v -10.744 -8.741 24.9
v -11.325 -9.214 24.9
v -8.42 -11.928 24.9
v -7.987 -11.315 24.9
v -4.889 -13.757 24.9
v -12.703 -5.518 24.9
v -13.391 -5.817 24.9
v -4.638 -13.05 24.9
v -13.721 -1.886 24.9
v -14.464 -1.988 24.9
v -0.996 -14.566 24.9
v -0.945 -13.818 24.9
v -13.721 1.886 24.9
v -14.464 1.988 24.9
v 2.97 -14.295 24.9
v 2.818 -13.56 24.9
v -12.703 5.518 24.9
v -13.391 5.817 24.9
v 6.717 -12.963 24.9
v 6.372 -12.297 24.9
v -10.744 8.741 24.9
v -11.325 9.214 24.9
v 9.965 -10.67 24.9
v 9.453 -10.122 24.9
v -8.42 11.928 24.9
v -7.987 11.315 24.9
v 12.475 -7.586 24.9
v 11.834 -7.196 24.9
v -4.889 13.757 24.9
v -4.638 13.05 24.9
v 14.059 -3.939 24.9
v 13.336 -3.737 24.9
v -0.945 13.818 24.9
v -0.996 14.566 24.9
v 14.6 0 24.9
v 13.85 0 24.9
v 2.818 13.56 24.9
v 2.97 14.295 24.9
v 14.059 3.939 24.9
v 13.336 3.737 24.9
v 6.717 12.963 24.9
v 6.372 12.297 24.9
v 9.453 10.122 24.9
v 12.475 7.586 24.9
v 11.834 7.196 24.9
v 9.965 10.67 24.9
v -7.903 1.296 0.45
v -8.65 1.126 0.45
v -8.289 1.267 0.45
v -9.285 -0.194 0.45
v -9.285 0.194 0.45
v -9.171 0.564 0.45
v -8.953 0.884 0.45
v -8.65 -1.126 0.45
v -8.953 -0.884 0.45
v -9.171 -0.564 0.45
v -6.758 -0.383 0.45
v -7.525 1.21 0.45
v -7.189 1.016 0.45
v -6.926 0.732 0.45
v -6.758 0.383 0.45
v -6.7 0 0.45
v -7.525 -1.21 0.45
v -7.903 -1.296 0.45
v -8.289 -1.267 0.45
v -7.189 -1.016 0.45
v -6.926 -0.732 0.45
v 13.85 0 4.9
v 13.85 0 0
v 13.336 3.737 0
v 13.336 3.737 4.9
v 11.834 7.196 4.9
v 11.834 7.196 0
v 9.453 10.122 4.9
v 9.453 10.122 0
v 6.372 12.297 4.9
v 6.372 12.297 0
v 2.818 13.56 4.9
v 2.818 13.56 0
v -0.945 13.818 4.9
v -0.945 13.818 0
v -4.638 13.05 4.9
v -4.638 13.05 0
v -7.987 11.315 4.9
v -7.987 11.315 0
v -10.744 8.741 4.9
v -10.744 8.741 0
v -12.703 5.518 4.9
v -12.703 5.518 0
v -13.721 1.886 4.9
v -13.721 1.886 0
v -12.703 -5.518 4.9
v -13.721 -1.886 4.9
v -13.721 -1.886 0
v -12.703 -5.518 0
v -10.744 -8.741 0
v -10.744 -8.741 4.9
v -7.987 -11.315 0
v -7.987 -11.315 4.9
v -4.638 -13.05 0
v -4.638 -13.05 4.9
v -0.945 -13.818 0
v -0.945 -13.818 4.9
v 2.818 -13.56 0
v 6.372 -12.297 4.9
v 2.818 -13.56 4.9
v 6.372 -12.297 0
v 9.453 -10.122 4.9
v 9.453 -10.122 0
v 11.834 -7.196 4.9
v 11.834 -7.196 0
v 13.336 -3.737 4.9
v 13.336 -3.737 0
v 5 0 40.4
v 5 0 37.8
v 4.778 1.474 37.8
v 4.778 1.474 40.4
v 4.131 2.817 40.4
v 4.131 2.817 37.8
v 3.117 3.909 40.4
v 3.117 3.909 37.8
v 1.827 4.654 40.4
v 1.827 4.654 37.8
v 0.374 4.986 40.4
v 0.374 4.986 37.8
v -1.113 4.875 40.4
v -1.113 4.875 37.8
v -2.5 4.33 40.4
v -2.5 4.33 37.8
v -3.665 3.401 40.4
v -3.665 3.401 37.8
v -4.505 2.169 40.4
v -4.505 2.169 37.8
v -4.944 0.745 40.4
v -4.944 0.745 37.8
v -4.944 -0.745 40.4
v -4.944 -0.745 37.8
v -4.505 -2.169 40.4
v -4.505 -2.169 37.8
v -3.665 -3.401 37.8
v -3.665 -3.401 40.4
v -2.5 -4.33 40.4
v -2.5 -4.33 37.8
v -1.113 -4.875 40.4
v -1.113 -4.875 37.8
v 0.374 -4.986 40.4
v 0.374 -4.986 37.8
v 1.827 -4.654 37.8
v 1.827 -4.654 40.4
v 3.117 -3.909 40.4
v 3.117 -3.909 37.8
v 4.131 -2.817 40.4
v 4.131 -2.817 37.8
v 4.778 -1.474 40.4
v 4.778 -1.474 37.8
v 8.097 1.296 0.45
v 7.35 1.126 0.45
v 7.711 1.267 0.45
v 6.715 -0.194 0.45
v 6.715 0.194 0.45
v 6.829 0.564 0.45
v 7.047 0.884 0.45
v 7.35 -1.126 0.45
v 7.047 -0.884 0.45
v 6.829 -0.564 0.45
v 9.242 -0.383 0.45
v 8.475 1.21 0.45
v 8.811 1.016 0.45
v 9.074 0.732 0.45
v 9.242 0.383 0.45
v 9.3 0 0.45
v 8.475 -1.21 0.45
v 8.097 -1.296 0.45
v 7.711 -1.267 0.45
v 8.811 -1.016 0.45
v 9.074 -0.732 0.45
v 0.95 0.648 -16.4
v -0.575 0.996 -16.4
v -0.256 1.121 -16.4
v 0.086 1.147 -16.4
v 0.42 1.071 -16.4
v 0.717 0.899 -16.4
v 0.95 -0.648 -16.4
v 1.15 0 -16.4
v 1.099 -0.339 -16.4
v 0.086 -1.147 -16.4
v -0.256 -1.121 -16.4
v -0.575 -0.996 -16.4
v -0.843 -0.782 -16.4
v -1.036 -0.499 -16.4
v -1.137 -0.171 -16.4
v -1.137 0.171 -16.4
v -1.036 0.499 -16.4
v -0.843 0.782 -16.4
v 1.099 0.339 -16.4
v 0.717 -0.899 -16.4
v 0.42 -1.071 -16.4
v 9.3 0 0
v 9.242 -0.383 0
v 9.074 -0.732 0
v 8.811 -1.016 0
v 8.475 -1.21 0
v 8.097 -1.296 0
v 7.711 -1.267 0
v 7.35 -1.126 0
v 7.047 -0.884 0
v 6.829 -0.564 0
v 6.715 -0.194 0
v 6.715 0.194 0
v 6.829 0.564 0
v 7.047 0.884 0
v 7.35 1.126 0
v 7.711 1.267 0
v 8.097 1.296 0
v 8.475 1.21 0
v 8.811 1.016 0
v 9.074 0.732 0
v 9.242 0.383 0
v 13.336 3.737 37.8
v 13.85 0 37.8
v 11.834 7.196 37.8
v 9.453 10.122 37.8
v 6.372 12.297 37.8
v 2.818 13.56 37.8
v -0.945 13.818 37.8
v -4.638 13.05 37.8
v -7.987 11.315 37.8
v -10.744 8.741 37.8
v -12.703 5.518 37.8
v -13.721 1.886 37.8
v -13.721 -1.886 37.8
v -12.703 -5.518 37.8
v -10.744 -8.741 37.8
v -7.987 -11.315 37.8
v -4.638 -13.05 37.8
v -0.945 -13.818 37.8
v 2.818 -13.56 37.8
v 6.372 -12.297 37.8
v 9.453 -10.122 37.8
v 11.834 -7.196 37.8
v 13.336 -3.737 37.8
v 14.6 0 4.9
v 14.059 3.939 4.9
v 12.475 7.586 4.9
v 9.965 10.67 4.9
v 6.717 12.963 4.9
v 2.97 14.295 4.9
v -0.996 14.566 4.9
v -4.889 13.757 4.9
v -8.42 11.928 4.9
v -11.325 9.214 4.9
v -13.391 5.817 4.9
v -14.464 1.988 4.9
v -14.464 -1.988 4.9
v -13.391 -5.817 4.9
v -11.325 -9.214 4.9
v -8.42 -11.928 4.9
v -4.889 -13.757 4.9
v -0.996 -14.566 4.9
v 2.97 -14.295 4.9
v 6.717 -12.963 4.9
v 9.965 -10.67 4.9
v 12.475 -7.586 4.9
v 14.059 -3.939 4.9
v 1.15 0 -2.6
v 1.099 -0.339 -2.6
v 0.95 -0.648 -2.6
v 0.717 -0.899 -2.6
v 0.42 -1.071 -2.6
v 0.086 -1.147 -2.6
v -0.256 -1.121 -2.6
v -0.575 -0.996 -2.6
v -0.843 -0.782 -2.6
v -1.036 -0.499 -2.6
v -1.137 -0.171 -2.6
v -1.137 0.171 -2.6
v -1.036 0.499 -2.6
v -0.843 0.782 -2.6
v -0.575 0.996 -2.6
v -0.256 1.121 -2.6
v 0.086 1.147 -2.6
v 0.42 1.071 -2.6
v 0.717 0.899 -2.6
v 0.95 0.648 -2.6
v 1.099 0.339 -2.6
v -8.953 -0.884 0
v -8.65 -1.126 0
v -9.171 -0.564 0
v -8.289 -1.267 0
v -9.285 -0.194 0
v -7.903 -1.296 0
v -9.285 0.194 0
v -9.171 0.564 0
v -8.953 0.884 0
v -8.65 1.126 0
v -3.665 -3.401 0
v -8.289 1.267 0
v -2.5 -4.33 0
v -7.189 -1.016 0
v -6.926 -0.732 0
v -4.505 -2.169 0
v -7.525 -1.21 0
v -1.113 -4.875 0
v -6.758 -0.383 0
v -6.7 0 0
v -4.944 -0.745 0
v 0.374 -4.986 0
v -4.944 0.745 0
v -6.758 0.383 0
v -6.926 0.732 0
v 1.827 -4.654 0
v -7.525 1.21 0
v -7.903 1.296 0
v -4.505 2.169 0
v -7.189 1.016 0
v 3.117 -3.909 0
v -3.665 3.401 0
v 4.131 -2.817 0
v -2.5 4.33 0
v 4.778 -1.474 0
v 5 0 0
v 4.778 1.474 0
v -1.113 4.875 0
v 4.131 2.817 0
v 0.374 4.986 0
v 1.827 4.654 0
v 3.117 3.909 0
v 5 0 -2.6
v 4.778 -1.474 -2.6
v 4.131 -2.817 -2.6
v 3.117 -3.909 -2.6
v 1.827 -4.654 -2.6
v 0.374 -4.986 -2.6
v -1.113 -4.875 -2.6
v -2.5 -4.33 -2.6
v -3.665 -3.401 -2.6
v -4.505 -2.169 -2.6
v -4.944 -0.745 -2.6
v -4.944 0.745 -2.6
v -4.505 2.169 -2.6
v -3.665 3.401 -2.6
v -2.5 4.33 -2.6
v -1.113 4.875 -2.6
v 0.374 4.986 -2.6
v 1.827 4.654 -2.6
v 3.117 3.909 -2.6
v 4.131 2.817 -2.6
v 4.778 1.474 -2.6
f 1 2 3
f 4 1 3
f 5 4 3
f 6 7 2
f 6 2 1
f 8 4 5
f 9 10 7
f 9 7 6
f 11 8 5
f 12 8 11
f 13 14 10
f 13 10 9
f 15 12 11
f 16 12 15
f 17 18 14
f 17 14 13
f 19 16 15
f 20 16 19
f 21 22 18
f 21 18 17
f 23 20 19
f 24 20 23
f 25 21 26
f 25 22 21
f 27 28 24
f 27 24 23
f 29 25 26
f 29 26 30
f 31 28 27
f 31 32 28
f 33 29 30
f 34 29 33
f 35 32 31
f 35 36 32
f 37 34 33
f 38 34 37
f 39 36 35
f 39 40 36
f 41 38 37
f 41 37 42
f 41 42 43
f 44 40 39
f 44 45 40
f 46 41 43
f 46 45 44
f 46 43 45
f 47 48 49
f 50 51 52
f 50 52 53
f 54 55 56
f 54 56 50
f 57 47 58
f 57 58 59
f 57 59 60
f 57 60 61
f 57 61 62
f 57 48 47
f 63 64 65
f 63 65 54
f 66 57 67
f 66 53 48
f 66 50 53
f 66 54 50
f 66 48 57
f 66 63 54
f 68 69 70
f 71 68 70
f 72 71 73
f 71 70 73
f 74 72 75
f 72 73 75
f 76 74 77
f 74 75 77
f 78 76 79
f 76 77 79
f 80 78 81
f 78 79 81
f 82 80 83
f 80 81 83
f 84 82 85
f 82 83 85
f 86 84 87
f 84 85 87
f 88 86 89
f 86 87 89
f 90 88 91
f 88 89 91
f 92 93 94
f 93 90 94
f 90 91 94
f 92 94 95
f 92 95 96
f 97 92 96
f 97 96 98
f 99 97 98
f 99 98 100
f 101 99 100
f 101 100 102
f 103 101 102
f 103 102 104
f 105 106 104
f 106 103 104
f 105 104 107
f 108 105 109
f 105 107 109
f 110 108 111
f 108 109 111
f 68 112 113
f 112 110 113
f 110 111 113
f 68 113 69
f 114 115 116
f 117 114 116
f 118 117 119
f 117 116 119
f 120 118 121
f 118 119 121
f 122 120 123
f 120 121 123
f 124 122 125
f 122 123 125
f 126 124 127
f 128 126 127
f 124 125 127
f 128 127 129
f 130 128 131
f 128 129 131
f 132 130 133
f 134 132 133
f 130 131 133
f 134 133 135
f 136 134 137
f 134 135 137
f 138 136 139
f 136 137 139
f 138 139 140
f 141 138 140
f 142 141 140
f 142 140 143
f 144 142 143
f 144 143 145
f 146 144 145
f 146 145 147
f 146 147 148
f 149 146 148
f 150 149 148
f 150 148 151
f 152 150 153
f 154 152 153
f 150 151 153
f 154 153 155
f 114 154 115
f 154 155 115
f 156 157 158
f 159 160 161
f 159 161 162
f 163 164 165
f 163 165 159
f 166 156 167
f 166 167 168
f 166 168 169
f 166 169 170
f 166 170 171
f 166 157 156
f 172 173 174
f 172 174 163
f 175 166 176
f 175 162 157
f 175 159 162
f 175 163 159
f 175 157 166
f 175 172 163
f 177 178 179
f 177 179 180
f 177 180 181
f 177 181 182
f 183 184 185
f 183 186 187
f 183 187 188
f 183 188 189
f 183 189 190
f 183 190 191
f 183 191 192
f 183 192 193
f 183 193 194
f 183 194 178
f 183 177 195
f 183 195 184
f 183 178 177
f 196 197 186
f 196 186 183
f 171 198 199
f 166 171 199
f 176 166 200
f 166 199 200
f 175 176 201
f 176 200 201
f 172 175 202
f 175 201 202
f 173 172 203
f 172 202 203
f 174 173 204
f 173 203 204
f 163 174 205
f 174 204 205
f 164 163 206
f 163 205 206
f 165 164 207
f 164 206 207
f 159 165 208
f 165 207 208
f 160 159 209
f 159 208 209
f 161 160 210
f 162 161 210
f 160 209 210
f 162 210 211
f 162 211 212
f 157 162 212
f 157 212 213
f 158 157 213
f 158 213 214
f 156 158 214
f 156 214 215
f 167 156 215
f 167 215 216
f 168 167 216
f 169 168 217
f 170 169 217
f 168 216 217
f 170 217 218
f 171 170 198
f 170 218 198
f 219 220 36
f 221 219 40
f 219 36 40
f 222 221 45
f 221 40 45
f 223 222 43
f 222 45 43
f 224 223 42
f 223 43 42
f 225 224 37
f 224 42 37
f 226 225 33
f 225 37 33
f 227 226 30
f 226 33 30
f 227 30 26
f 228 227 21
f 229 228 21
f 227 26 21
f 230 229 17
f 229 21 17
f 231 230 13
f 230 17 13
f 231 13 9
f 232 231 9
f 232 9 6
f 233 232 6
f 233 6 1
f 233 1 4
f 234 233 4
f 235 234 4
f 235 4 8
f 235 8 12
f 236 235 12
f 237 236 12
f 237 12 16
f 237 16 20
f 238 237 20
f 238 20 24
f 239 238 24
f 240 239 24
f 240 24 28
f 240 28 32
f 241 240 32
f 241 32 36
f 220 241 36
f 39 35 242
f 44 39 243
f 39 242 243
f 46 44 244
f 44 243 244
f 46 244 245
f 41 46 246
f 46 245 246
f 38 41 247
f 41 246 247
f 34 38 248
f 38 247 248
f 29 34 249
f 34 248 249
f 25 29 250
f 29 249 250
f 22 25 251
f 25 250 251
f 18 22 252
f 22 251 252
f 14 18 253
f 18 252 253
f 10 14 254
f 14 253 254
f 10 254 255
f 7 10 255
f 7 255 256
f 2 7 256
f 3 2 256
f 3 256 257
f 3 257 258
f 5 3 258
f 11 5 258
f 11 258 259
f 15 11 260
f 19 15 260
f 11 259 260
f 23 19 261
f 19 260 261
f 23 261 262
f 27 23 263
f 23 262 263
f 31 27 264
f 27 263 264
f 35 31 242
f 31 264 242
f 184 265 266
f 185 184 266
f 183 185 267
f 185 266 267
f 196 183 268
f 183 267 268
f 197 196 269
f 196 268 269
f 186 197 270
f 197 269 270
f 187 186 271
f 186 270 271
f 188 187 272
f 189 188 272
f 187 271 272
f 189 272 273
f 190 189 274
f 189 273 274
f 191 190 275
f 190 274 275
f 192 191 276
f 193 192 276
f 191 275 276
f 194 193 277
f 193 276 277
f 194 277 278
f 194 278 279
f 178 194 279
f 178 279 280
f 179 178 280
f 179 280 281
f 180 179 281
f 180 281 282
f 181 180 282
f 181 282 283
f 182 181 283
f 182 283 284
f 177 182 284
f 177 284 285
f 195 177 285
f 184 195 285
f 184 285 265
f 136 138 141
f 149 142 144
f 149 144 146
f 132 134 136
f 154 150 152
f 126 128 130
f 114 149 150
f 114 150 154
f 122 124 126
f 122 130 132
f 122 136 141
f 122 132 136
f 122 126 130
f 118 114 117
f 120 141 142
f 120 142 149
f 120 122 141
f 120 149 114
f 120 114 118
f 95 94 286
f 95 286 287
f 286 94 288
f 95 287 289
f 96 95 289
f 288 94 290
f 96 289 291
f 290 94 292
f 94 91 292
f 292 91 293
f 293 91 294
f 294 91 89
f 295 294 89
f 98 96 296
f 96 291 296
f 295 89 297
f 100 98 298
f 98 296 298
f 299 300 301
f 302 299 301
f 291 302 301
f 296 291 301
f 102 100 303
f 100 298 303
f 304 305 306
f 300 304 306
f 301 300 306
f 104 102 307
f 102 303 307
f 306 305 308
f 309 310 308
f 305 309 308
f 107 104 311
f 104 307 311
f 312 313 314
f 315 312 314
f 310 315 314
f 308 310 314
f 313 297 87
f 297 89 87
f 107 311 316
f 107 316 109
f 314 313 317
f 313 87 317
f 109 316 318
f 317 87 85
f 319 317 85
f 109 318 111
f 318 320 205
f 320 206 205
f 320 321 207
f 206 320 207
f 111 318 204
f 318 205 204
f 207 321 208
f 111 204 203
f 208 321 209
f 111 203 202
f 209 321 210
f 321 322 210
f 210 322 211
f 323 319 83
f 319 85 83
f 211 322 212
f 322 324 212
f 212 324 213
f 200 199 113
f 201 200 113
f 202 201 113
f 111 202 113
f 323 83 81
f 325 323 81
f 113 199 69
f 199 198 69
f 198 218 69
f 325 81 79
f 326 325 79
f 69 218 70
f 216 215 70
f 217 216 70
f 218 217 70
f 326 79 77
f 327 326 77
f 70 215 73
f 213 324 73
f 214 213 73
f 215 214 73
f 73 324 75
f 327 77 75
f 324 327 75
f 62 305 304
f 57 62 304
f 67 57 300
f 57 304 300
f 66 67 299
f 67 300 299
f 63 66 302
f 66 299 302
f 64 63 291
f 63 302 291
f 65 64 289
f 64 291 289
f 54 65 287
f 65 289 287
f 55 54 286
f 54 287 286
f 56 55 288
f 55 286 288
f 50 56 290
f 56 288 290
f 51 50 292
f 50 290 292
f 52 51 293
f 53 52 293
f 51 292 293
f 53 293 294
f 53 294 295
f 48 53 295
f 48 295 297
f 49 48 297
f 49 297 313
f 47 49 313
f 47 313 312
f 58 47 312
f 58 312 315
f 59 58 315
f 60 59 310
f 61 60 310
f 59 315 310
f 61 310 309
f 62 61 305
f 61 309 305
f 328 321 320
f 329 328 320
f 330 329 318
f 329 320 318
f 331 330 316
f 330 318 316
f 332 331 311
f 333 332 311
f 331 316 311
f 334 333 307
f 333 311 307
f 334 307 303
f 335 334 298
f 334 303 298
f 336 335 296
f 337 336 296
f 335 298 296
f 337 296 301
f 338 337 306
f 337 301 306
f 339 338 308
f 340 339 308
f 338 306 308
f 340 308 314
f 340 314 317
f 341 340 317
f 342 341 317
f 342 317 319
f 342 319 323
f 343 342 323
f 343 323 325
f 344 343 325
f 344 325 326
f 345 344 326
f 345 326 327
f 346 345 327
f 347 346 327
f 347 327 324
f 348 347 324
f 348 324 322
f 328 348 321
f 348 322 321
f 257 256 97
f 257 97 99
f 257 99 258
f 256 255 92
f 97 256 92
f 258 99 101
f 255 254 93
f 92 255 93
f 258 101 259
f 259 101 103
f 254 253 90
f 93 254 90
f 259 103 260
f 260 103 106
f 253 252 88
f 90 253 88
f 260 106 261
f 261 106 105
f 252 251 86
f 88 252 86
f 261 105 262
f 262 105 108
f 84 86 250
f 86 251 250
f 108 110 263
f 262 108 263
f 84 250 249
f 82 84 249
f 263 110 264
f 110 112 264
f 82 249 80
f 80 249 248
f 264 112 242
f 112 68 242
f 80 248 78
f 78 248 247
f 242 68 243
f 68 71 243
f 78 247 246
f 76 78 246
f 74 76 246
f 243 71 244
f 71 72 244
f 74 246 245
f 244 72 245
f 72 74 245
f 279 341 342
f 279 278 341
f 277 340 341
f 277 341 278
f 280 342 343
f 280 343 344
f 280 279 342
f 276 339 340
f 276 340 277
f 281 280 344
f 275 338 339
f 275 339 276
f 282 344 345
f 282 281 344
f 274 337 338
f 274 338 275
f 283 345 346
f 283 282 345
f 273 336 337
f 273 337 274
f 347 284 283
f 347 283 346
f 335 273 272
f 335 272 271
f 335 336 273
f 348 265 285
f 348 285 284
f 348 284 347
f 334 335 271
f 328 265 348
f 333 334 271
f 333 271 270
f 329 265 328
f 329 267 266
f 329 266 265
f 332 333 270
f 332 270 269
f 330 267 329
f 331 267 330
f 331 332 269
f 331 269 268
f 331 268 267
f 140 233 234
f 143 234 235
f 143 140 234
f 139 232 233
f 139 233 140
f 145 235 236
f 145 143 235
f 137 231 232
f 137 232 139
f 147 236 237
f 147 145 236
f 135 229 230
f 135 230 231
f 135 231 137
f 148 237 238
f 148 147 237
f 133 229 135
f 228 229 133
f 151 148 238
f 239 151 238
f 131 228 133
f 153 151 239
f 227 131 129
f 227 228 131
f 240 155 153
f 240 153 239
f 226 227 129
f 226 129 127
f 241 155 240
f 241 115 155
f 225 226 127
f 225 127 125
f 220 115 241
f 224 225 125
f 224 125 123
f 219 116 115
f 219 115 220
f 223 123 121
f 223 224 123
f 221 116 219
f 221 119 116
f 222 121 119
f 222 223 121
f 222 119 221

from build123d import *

# Parameters (mm, degrees)
SKETCH_R     = 13.85
PAD_DEPTH    = 37.8
SKETCH001_R  = 14.6
PAD001_DEPTH = 20
SKETCH002_R  = 5
PAD002_DEPTH = 2.6
SKETCH003_R  = 1.15
PAD003_DEPTH = 16.4
SKETCH004_R  = 5
PAD004_DEPTH = 2.6
SKETCH005_R  = 1.3
POCKET_DEPTH = 0.45


with BuildPart() as part:
    # Sketch → Pad (new body)
    with BuildSketch(Plane.XY):
        Circle(SKETCH_R)
    extrude(amount=PAD_DEPTH)

    # Sketch001 (on Face3 of Pad) → Pad001 (join)
    with BuildSketch(Plane.XY.offset(4.9)):
        Circle(SKETCH001_R)
    extrude(amount=PAD001_DEPTH)

    # Sketch002 (on Face7 of Pad001) → Pad002 (join)
    with BuildSketch(Plane.XY.offset(37.8)):
        Circle(SKETCH002_R)
    extrude(amount=PAD002_DEPTH)

    # Sketch003 (on Face2 of Pad002) → Pad003 (join)
    with BuildSketch(Plane(origin=(0, 0, 0), x_dir=(1, 0, 0), z_dir=(0, 0, -1))):
        Circle(SKETCH003_R)
    extrude(amount=PAD003_DEPTH)

    # Sketch004 (on Face2 of Pad003) → Pad004 (join)
    with BuildSketch(Plane(origin=(0, 0, 0), x_dir=(1, 0, 0), z_dir=(0, 0, -1))):
        Circle(SKETCH004_R)
    extrude(amount=PAD004_DEPTH)

    # Sketch005 (on Face2 of Pad004) → Pocket (cut)
    with BuildSketch(Plane(origin=(0, 0, 0), x_dir=(1, 0, 0), z_dir=(0, 0, -1))):
        with Locations((8, 0)):
            Circle(SKETCH005_R)
        with Locations((-8, 0)):
            Circle(SKETCH005_R)
    extrude(amount=-POCKET_DEPTH, mode=Mode.SUBTRACT)


solid = part.part
